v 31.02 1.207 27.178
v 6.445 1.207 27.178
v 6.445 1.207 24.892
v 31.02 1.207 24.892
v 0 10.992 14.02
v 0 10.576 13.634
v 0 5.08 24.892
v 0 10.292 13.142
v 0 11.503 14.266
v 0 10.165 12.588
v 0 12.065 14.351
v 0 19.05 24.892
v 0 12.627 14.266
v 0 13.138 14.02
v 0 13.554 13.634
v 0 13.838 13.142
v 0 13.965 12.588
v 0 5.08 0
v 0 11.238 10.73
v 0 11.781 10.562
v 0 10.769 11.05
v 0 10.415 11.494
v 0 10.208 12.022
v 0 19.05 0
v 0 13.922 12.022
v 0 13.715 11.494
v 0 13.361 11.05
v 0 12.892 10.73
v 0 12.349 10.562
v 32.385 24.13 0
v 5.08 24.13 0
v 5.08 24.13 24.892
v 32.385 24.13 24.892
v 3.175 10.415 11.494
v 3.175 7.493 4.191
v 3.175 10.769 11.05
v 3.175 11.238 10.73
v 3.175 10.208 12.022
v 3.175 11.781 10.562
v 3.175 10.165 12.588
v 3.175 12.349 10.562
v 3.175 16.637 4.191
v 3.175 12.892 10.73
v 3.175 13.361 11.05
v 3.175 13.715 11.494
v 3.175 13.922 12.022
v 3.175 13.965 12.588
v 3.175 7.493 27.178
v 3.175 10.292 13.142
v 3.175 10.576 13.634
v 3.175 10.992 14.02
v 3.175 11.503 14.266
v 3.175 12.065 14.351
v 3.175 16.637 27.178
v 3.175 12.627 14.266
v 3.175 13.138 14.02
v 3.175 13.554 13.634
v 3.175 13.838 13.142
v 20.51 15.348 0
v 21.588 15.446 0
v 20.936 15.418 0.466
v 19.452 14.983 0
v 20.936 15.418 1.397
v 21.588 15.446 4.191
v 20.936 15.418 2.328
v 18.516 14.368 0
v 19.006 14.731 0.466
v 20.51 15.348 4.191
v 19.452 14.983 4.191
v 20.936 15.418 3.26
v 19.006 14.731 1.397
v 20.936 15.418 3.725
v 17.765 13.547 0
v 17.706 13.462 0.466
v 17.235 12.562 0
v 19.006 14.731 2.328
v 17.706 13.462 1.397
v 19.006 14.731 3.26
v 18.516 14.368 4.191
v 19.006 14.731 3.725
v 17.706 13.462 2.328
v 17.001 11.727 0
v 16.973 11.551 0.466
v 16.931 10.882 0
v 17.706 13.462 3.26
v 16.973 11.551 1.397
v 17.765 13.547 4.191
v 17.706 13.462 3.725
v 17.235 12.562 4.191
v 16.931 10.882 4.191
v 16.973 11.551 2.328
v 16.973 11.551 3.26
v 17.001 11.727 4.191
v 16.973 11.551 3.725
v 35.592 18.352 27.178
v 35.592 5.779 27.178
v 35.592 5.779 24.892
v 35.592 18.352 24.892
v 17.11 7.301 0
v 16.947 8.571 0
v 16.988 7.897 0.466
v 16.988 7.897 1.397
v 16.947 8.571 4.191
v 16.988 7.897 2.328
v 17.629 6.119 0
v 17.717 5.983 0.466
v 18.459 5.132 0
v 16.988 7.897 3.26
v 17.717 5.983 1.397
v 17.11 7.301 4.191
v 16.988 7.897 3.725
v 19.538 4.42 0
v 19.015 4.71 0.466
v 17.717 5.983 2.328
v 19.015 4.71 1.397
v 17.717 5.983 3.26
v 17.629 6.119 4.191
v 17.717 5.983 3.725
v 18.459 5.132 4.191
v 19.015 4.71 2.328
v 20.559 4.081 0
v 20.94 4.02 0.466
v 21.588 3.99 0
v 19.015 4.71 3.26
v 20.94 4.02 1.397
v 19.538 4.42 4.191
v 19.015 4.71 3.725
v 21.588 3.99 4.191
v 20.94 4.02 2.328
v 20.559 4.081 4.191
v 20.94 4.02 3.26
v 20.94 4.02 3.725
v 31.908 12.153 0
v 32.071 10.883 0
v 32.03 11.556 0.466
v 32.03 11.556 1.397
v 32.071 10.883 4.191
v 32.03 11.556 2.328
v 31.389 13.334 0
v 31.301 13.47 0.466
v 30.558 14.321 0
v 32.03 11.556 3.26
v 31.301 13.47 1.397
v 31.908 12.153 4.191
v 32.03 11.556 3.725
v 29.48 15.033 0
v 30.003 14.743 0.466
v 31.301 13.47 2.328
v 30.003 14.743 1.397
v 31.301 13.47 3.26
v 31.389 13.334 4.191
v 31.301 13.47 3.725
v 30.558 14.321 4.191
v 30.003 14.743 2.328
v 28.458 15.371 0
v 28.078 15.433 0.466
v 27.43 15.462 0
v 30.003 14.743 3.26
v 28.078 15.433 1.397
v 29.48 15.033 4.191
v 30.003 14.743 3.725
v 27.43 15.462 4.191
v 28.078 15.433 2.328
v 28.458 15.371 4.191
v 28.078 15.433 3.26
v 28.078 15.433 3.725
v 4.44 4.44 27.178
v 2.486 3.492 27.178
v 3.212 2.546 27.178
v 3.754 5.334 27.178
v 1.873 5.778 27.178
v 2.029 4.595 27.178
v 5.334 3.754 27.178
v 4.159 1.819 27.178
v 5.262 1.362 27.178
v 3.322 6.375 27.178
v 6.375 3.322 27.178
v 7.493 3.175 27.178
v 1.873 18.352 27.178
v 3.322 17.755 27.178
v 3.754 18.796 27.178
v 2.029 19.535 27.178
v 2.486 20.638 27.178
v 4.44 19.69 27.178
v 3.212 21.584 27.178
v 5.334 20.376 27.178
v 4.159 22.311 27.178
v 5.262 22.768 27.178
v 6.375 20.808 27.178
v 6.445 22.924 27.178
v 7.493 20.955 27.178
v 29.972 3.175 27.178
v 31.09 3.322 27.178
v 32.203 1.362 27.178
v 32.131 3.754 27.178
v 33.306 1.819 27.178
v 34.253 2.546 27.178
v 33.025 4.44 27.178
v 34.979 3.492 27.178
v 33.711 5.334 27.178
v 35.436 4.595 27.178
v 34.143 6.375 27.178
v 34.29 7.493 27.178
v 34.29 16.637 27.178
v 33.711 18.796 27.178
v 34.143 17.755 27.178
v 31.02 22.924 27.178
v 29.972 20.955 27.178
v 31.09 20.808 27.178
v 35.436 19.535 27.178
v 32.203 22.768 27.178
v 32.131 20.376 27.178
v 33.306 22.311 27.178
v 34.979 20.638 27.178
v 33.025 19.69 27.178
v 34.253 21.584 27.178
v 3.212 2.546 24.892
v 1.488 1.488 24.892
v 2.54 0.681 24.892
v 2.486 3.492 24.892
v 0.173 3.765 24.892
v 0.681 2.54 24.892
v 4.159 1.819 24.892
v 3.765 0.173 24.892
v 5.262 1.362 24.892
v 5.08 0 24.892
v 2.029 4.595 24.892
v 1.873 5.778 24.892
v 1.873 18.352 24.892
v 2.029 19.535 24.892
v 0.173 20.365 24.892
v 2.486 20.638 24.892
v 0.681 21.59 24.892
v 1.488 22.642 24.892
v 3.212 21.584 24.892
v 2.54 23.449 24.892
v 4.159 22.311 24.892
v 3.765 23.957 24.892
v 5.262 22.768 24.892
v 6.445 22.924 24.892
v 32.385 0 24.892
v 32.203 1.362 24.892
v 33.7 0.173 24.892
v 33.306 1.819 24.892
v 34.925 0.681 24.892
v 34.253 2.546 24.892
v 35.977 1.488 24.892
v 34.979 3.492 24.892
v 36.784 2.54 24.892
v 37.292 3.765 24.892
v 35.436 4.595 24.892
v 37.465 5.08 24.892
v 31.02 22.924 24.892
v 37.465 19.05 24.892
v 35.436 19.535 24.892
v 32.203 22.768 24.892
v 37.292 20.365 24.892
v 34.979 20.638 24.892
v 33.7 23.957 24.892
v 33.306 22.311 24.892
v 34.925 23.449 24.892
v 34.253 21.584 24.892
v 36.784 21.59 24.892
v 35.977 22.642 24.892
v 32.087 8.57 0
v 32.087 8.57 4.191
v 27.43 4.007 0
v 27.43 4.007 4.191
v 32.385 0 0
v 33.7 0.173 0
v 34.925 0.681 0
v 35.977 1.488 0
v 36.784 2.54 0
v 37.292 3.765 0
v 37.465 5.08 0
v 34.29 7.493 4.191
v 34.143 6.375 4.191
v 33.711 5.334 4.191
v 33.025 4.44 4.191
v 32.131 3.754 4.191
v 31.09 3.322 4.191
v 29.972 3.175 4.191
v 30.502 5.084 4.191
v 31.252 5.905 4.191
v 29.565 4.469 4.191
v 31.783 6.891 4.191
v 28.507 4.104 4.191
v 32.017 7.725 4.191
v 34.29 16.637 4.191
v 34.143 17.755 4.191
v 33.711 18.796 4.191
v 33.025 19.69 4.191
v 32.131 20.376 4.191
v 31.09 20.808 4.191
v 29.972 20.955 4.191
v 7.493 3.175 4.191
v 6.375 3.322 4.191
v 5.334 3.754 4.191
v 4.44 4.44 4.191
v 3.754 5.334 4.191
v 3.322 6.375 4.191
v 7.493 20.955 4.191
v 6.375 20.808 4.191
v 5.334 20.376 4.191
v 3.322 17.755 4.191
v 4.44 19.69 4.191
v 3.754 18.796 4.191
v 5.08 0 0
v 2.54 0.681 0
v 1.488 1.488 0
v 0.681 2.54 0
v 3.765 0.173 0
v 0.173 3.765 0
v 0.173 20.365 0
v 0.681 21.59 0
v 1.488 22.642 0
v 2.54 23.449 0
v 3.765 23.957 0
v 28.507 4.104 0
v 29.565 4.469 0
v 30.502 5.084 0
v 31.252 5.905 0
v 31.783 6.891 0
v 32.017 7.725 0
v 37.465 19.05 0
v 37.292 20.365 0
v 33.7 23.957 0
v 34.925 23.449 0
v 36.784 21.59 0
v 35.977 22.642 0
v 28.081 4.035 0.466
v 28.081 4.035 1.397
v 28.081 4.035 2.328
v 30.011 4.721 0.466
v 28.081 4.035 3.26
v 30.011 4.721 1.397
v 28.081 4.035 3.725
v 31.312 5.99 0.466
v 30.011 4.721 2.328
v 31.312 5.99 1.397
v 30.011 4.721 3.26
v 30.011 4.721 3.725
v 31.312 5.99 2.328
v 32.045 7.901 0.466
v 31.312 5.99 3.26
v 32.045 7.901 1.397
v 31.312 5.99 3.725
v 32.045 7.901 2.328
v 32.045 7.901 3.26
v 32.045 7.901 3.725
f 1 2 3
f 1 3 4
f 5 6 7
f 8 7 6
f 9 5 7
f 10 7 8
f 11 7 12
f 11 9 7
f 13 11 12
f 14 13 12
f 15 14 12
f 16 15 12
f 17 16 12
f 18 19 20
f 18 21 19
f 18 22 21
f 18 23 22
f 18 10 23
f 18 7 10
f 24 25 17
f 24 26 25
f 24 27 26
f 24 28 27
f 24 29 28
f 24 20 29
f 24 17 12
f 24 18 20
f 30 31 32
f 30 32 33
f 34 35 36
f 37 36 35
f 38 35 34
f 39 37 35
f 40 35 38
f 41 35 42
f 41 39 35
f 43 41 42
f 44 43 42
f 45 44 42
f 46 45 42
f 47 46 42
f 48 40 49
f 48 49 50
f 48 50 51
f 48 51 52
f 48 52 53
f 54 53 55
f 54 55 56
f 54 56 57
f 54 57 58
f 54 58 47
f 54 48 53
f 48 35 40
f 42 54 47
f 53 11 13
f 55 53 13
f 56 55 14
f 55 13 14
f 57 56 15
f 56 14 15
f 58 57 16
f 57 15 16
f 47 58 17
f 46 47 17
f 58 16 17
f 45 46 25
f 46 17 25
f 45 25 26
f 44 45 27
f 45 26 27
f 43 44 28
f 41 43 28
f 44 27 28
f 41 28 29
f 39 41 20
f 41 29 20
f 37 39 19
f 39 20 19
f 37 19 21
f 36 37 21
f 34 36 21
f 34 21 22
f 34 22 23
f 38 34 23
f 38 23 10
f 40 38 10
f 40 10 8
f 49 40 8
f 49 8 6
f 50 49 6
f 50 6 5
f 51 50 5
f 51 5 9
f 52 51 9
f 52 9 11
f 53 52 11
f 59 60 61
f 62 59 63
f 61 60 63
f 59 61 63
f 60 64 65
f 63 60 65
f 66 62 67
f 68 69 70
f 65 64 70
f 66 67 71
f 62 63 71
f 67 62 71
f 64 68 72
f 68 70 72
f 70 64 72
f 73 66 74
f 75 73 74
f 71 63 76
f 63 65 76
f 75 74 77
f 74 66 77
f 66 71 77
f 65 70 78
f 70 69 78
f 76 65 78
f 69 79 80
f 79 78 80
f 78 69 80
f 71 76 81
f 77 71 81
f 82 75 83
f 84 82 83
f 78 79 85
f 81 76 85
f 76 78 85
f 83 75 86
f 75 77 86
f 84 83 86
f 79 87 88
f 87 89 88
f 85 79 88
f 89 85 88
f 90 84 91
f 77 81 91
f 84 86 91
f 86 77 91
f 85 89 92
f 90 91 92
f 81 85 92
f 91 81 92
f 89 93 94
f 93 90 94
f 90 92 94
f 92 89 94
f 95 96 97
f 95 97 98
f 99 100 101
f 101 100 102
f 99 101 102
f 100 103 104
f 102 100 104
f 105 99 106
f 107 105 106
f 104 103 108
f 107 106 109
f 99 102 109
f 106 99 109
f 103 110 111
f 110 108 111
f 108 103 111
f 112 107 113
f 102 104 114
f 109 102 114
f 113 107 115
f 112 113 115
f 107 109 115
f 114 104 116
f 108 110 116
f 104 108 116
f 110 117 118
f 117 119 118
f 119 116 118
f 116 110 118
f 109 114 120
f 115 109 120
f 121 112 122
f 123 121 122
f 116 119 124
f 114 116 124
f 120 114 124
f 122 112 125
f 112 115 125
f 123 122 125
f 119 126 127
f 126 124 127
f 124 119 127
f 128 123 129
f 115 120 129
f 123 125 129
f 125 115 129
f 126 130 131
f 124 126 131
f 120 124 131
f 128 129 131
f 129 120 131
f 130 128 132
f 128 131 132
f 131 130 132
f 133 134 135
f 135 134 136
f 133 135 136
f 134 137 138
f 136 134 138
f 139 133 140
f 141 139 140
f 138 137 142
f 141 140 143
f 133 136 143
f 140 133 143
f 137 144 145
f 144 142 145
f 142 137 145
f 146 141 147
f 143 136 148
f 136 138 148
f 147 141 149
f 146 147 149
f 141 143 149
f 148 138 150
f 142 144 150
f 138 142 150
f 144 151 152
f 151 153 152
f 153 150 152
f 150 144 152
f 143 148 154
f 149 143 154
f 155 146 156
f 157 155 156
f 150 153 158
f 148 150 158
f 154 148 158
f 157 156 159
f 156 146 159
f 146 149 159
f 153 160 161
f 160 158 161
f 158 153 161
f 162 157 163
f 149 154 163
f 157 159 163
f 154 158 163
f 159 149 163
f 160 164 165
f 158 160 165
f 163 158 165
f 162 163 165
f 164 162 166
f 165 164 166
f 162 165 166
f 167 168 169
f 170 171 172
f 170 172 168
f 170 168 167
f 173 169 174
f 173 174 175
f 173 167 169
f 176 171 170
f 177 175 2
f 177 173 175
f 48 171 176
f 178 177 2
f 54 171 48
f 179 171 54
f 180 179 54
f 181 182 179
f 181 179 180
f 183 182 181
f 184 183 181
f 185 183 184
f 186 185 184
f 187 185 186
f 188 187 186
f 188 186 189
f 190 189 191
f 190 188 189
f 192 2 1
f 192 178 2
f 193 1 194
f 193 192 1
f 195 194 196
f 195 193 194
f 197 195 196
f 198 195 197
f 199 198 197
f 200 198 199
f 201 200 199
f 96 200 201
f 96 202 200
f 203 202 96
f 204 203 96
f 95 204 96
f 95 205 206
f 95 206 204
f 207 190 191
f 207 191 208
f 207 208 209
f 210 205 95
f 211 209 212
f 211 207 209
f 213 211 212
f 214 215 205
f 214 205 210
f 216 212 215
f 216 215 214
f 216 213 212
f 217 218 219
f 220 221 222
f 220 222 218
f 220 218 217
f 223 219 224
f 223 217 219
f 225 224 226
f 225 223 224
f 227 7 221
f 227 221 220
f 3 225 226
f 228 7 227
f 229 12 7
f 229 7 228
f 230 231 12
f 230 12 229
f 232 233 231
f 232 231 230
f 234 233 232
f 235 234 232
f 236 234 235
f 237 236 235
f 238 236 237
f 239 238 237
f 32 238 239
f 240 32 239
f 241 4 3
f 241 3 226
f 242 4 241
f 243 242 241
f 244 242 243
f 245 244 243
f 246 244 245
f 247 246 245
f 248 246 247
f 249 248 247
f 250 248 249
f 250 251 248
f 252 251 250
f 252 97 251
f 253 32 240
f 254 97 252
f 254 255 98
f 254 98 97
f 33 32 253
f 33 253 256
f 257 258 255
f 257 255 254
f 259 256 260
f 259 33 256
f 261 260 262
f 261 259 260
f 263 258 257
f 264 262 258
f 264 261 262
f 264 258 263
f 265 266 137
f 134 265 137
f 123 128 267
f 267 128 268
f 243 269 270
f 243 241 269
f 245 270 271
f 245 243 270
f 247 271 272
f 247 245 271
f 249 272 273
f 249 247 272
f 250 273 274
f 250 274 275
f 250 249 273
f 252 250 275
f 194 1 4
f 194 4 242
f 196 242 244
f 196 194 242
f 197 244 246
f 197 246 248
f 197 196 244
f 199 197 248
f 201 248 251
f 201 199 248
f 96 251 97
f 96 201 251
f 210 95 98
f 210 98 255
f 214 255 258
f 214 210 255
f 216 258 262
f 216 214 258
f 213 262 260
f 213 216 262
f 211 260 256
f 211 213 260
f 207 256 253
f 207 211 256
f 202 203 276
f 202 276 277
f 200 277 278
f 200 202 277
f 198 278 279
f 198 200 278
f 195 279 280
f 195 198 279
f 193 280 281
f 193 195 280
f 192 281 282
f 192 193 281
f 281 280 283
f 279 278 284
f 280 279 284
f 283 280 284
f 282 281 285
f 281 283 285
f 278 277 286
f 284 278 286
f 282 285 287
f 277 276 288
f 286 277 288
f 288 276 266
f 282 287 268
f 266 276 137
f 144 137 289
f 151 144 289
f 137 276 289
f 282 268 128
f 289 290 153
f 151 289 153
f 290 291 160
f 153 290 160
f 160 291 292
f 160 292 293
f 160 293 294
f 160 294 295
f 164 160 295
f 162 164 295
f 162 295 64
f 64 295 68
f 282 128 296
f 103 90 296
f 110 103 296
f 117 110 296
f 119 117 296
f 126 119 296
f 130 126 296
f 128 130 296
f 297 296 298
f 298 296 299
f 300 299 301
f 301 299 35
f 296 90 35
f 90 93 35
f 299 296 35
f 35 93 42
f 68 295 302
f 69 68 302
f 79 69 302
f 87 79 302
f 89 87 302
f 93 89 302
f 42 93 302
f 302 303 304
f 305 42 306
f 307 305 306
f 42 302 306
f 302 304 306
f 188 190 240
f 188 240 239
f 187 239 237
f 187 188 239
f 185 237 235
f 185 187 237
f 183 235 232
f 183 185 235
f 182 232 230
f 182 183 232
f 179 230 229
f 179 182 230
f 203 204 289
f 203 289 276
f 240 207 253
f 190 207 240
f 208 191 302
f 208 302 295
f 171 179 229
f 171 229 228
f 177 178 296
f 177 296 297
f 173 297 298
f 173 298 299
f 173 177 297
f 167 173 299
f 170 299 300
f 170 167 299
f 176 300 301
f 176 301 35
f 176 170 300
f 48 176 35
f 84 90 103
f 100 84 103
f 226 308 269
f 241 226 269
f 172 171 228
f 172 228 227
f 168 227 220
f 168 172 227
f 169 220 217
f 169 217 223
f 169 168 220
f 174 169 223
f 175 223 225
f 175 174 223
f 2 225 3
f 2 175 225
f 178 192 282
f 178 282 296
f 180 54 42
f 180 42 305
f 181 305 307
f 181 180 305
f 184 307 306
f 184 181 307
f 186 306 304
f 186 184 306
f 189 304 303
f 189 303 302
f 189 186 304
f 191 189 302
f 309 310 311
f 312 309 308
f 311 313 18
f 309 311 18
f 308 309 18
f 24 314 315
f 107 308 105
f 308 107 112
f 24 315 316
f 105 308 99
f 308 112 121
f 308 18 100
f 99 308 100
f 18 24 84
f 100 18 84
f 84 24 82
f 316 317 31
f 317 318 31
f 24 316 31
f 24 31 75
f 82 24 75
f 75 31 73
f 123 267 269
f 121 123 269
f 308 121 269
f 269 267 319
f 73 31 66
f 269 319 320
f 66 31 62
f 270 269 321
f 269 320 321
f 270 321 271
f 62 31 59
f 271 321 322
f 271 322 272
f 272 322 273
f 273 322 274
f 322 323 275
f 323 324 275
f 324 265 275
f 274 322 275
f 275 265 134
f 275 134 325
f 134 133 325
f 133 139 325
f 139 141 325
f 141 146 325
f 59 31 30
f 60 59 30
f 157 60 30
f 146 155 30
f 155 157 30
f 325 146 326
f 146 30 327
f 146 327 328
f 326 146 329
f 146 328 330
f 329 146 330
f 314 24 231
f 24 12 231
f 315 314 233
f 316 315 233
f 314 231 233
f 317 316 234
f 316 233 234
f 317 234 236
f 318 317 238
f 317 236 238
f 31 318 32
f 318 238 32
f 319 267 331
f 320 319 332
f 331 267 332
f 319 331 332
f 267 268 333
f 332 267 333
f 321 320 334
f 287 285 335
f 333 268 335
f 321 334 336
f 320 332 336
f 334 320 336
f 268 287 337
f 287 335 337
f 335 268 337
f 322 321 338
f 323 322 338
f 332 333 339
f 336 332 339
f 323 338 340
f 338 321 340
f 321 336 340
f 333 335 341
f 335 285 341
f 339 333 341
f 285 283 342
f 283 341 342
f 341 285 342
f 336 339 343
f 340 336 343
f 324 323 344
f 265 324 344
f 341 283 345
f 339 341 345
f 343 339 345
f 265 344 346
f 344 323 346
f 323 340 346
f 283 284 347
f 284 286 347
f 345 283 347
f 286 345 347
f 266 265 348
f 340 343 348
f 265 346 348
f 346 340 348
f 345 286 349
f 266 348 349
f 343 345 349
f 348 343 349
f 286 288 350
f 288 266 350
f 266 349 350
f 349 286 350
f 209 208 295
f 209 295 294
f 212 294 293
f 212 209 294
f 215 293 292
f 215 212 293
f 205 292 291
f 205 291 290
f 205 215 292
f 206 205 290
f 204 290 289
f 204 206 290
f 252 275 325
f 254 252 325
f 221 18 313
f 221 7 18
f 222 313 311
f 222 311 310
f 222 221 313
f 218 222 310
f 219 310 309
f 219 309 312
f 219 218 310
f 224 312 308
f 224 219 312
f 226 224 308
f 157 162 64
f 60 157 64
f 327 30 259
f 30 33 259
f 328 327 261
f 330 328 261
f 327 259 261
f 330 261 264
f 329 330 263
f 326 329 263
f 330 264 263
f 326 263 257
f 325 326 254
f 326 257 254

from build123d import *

# Parameters (mm, degrees)
SKETCH2_W           = 37.465
SKETCH2_H           = 24.13
BOSS_EXTRUDE1_DEPTH = 24.892
CUT_EXTRUDE1_DEPTH  = 20.701
CUT_EXTRUDE3_DEPTH  = 4.191
FILLET1_R           = 5.08
BOSS_EXTRUDE3_START = 2.286
BOSS_EXTRUDE3_DEPTH = 2.286
SKETCH8_R           = 1.905
CUT_EXTRUDE4_DEPTH  = 7.62


with BuildPart() as part:
    # Sketch2 → Boss-Extrude1 (new body)
    with BuildSketch(Plane.XY):
        with Locations((18.7325, 12.065)):
            Rectangle(SKETCH2_W, SKETCH2_H)
    extrude(amount=BOSS_EXTRUDE1_DEPTH)

    # Sketch3 → Cut-Extrude1 (cut)
    with BuildSketch(Plane.XY.offset(24.892)):
        with BuildLine():
            ThreePointArc((3.175, 16.637), (4.439712919, 19.690287081), (7.493, 20.955))
            Line((7.493, 20.955), (29.972, 20.955))
            ThreePointArc((29.972, 20.955), (33.025287081, 19.690287081), (34.29, 16.637))
            Line((34.29, 16.637), (34.29, 7.493))
            ThreePointArc((34.29, 7.493), (33.025287081, 4.439712919), (29.972, 3.175))
            Line((29.972, 3.175), (7.493, 3.175))
            ThreePointArc((7.493, 3.175), (4.439712919, 4.439712919), (3.175, 7.493))
            Line((3.175, 7.493), (3.175, 16.637))
        make_face()
    extrude(amount=-CUT_EXTRUDE1_DEPTH, mode=Mode.SUBTRACT)

    # Sketch4 → Cut-Extrude3 (cut)
    with BuildSketch(Plane.XY.offset(4.191)):
        with BuildLine():
            Line((32.086974483, 8.570131), (32.07077796, 10.882539488))
            add(Edge.make_bspline(
                [(32.07077796, 10.882539488), (32.073215089, 11.03512727), (32.05346317, 11.384531492), (31.98348624, 11.89897185), (31.690265244, 12.891461502), (30.781603575, 14.240804474), (29.41900903, 15.119220909), (28.414706523, 15.393168176), (27.909381539, 15.452204781), (27.554769457, 15.464756938), (27.429691001, 15.46229384)],
                knots=[0, 0, 0, 0.046875, 0.09375, 0.1875, 0.375, 0.625, 0.8125, 0.90625, 0.953125, 1, 1, 1], degree=2))
            Line((27.429691001, 15.46229384), (21.587714207, 15.44582783))
            add(Edge.make_bspline(
                [(21.587714207, 15.44582783), (21.462803996, 15.448731855), (21.106730304, 15.437338634), (20.595765352, 15.378996632), (19.591692577, 15.107051395), (18.225687665, 14.229774678), (17.316214622, 12.885953496), (17.020022679, 11.889285009), (16.949885556, 11.382167163), (16.92906595, 11.034797324), (16.930958193, 10.882006896)],
                knots=[0, 0, 0, 0.046875, 0.09375, 0.1875, 0.375, 0.625, 0.8125, 0.90625, 0.953125, 1, 1, 1], degree=2))
            Line((16.930958193, 10.882006896), (16.947147256, 8.570663591))
            add(Edge.make_bspline(
                [(16.947147256, 8.570663591), (16.944692803, 8.418076087), (16.96440505, 8.068669624), (17.034323571, 7.554221325), (17.32743188, 6.561698387), (18.235940341, 5.212252256), (19.598435143, 4.33368112), (20.60270654, 4.059619828), (21.108024818, 4.00052585), (21.462635472, 3.98793343), (21.587714207, 3.990382327)],
                knots=[0, 0, 0, 0.046875, 0.09375, 0.1875, 0.375, 0.625, 0.8125, 0.90625, 0.953125, 1, 1, 1], degree=2))
            Line((21.587714207, 3.990382327), (27.429691002, 4.006848338))
            add(Edge.make_bspline(
                [(27.429691002, 4.006848338), (27.554600877, 4.003929875), (27.910675883, 4.015281941), (28.421647575, 4.073564883), (29.425751775, 4.345394065), (30.791858076, 5.22251289), (31.701486436, 6.566228943), (31.997793574, 7.562863188), (32.067989311, 8.069972924), (32.088849066, 8.417340355), (32.086974483, 8.570131)],
                knots=[0, 0, 0, 0.046875, 0.09375, 0.1875, 0.375, 0.625, 0.8125, 0.90625, 0.953125, 1, 1, 1], degree=2))
        make_face()
    extrude(amount=-CUT_EXTRUDE3_DEPTH, mode=Mode.SUBTRACT)

    # Fillet1
    fillet1_edges = [part.edges().sort_by_distance(p)[0] for p in [
        (0, 24.13, 12.446),
        (37.465, 24.13, 12.446),
        (37.465, 0, 12.446),
        (0, 0, 12.446),
    ]]
    fillet(fillet1_edges, radius=FILLET1_R)

    # Sketch7 → Boss-Extrude3 (add)
    with BuildSketch(Plane.XY.offset(24.892).offset(BOSS_EXTRUDE3_START)):
        with BuildLine():
            Line((6.44525, 1.2065), (31.01975, 1.2065))
            ThreePointArc((31.01975, 1.2065), (34.252642204, 2.545607796), (35.59175, 5.7785))
            Line((35.59175, 5.7785), (35.59175, 18.3515))
            ThreePointArc((35.59175, 18.3515), (34.252642204, 21.584392204), (31.01975, 22.9235))
            Line((31.01975, 22.9235), (6.44525, 22.9235))
            ThreePointArc((6.44525, 22.9235), (3.212357796, 21.584392204), (1.87325, 18.3515))
            Line((1.87325, 18.3515), (1.87325, 5.7785))
            ThreePointArc((1.87325, 5.7785), (3.212357796, 2.545607796), (6.44525, 1.2065))
        make_face()
        with BuildLine():
            Line((7.493, 20.955), (29.972, 20.955))
            ThreePointArc((29.972, 20.955), (33.025287081, 19.690287081), (34.29, 16.637))
            Line((34.29, 16.637), (34.29, 7.493))
            ThreePointArc((34.29, 7.493), (33.025287081, 4.439712919), (29.972, 3.175))
            Line((29.972, 3.175), (7.493, 3.175))
            ThreePointArc((7.493, 3.175), (4.439712919, 4.439712919), (3.175, 7.493))
            Line((3.175, 7.493), (3.175, 16.637))
            ThreePointArc((3.175, 16.637), (4.439712919, 19.690287081), (7.493, 20.955))
        make_face(mode=Mode.SUBTRACT)
    extrude(amount=-BOSS_EXTRUDE3_DEPTH)

    # Sketch8 → Cut-Extrude4 (cut)
    with BuildSketch(Plane.ZY):
        with Locations((12.446, 12.065)):
            Circle(SKETCH8_R)
    extrude(amount=-CUT_EXTRUDE4_DEPTH, mode=Mode.SUBTRACT)


solid = part.part
